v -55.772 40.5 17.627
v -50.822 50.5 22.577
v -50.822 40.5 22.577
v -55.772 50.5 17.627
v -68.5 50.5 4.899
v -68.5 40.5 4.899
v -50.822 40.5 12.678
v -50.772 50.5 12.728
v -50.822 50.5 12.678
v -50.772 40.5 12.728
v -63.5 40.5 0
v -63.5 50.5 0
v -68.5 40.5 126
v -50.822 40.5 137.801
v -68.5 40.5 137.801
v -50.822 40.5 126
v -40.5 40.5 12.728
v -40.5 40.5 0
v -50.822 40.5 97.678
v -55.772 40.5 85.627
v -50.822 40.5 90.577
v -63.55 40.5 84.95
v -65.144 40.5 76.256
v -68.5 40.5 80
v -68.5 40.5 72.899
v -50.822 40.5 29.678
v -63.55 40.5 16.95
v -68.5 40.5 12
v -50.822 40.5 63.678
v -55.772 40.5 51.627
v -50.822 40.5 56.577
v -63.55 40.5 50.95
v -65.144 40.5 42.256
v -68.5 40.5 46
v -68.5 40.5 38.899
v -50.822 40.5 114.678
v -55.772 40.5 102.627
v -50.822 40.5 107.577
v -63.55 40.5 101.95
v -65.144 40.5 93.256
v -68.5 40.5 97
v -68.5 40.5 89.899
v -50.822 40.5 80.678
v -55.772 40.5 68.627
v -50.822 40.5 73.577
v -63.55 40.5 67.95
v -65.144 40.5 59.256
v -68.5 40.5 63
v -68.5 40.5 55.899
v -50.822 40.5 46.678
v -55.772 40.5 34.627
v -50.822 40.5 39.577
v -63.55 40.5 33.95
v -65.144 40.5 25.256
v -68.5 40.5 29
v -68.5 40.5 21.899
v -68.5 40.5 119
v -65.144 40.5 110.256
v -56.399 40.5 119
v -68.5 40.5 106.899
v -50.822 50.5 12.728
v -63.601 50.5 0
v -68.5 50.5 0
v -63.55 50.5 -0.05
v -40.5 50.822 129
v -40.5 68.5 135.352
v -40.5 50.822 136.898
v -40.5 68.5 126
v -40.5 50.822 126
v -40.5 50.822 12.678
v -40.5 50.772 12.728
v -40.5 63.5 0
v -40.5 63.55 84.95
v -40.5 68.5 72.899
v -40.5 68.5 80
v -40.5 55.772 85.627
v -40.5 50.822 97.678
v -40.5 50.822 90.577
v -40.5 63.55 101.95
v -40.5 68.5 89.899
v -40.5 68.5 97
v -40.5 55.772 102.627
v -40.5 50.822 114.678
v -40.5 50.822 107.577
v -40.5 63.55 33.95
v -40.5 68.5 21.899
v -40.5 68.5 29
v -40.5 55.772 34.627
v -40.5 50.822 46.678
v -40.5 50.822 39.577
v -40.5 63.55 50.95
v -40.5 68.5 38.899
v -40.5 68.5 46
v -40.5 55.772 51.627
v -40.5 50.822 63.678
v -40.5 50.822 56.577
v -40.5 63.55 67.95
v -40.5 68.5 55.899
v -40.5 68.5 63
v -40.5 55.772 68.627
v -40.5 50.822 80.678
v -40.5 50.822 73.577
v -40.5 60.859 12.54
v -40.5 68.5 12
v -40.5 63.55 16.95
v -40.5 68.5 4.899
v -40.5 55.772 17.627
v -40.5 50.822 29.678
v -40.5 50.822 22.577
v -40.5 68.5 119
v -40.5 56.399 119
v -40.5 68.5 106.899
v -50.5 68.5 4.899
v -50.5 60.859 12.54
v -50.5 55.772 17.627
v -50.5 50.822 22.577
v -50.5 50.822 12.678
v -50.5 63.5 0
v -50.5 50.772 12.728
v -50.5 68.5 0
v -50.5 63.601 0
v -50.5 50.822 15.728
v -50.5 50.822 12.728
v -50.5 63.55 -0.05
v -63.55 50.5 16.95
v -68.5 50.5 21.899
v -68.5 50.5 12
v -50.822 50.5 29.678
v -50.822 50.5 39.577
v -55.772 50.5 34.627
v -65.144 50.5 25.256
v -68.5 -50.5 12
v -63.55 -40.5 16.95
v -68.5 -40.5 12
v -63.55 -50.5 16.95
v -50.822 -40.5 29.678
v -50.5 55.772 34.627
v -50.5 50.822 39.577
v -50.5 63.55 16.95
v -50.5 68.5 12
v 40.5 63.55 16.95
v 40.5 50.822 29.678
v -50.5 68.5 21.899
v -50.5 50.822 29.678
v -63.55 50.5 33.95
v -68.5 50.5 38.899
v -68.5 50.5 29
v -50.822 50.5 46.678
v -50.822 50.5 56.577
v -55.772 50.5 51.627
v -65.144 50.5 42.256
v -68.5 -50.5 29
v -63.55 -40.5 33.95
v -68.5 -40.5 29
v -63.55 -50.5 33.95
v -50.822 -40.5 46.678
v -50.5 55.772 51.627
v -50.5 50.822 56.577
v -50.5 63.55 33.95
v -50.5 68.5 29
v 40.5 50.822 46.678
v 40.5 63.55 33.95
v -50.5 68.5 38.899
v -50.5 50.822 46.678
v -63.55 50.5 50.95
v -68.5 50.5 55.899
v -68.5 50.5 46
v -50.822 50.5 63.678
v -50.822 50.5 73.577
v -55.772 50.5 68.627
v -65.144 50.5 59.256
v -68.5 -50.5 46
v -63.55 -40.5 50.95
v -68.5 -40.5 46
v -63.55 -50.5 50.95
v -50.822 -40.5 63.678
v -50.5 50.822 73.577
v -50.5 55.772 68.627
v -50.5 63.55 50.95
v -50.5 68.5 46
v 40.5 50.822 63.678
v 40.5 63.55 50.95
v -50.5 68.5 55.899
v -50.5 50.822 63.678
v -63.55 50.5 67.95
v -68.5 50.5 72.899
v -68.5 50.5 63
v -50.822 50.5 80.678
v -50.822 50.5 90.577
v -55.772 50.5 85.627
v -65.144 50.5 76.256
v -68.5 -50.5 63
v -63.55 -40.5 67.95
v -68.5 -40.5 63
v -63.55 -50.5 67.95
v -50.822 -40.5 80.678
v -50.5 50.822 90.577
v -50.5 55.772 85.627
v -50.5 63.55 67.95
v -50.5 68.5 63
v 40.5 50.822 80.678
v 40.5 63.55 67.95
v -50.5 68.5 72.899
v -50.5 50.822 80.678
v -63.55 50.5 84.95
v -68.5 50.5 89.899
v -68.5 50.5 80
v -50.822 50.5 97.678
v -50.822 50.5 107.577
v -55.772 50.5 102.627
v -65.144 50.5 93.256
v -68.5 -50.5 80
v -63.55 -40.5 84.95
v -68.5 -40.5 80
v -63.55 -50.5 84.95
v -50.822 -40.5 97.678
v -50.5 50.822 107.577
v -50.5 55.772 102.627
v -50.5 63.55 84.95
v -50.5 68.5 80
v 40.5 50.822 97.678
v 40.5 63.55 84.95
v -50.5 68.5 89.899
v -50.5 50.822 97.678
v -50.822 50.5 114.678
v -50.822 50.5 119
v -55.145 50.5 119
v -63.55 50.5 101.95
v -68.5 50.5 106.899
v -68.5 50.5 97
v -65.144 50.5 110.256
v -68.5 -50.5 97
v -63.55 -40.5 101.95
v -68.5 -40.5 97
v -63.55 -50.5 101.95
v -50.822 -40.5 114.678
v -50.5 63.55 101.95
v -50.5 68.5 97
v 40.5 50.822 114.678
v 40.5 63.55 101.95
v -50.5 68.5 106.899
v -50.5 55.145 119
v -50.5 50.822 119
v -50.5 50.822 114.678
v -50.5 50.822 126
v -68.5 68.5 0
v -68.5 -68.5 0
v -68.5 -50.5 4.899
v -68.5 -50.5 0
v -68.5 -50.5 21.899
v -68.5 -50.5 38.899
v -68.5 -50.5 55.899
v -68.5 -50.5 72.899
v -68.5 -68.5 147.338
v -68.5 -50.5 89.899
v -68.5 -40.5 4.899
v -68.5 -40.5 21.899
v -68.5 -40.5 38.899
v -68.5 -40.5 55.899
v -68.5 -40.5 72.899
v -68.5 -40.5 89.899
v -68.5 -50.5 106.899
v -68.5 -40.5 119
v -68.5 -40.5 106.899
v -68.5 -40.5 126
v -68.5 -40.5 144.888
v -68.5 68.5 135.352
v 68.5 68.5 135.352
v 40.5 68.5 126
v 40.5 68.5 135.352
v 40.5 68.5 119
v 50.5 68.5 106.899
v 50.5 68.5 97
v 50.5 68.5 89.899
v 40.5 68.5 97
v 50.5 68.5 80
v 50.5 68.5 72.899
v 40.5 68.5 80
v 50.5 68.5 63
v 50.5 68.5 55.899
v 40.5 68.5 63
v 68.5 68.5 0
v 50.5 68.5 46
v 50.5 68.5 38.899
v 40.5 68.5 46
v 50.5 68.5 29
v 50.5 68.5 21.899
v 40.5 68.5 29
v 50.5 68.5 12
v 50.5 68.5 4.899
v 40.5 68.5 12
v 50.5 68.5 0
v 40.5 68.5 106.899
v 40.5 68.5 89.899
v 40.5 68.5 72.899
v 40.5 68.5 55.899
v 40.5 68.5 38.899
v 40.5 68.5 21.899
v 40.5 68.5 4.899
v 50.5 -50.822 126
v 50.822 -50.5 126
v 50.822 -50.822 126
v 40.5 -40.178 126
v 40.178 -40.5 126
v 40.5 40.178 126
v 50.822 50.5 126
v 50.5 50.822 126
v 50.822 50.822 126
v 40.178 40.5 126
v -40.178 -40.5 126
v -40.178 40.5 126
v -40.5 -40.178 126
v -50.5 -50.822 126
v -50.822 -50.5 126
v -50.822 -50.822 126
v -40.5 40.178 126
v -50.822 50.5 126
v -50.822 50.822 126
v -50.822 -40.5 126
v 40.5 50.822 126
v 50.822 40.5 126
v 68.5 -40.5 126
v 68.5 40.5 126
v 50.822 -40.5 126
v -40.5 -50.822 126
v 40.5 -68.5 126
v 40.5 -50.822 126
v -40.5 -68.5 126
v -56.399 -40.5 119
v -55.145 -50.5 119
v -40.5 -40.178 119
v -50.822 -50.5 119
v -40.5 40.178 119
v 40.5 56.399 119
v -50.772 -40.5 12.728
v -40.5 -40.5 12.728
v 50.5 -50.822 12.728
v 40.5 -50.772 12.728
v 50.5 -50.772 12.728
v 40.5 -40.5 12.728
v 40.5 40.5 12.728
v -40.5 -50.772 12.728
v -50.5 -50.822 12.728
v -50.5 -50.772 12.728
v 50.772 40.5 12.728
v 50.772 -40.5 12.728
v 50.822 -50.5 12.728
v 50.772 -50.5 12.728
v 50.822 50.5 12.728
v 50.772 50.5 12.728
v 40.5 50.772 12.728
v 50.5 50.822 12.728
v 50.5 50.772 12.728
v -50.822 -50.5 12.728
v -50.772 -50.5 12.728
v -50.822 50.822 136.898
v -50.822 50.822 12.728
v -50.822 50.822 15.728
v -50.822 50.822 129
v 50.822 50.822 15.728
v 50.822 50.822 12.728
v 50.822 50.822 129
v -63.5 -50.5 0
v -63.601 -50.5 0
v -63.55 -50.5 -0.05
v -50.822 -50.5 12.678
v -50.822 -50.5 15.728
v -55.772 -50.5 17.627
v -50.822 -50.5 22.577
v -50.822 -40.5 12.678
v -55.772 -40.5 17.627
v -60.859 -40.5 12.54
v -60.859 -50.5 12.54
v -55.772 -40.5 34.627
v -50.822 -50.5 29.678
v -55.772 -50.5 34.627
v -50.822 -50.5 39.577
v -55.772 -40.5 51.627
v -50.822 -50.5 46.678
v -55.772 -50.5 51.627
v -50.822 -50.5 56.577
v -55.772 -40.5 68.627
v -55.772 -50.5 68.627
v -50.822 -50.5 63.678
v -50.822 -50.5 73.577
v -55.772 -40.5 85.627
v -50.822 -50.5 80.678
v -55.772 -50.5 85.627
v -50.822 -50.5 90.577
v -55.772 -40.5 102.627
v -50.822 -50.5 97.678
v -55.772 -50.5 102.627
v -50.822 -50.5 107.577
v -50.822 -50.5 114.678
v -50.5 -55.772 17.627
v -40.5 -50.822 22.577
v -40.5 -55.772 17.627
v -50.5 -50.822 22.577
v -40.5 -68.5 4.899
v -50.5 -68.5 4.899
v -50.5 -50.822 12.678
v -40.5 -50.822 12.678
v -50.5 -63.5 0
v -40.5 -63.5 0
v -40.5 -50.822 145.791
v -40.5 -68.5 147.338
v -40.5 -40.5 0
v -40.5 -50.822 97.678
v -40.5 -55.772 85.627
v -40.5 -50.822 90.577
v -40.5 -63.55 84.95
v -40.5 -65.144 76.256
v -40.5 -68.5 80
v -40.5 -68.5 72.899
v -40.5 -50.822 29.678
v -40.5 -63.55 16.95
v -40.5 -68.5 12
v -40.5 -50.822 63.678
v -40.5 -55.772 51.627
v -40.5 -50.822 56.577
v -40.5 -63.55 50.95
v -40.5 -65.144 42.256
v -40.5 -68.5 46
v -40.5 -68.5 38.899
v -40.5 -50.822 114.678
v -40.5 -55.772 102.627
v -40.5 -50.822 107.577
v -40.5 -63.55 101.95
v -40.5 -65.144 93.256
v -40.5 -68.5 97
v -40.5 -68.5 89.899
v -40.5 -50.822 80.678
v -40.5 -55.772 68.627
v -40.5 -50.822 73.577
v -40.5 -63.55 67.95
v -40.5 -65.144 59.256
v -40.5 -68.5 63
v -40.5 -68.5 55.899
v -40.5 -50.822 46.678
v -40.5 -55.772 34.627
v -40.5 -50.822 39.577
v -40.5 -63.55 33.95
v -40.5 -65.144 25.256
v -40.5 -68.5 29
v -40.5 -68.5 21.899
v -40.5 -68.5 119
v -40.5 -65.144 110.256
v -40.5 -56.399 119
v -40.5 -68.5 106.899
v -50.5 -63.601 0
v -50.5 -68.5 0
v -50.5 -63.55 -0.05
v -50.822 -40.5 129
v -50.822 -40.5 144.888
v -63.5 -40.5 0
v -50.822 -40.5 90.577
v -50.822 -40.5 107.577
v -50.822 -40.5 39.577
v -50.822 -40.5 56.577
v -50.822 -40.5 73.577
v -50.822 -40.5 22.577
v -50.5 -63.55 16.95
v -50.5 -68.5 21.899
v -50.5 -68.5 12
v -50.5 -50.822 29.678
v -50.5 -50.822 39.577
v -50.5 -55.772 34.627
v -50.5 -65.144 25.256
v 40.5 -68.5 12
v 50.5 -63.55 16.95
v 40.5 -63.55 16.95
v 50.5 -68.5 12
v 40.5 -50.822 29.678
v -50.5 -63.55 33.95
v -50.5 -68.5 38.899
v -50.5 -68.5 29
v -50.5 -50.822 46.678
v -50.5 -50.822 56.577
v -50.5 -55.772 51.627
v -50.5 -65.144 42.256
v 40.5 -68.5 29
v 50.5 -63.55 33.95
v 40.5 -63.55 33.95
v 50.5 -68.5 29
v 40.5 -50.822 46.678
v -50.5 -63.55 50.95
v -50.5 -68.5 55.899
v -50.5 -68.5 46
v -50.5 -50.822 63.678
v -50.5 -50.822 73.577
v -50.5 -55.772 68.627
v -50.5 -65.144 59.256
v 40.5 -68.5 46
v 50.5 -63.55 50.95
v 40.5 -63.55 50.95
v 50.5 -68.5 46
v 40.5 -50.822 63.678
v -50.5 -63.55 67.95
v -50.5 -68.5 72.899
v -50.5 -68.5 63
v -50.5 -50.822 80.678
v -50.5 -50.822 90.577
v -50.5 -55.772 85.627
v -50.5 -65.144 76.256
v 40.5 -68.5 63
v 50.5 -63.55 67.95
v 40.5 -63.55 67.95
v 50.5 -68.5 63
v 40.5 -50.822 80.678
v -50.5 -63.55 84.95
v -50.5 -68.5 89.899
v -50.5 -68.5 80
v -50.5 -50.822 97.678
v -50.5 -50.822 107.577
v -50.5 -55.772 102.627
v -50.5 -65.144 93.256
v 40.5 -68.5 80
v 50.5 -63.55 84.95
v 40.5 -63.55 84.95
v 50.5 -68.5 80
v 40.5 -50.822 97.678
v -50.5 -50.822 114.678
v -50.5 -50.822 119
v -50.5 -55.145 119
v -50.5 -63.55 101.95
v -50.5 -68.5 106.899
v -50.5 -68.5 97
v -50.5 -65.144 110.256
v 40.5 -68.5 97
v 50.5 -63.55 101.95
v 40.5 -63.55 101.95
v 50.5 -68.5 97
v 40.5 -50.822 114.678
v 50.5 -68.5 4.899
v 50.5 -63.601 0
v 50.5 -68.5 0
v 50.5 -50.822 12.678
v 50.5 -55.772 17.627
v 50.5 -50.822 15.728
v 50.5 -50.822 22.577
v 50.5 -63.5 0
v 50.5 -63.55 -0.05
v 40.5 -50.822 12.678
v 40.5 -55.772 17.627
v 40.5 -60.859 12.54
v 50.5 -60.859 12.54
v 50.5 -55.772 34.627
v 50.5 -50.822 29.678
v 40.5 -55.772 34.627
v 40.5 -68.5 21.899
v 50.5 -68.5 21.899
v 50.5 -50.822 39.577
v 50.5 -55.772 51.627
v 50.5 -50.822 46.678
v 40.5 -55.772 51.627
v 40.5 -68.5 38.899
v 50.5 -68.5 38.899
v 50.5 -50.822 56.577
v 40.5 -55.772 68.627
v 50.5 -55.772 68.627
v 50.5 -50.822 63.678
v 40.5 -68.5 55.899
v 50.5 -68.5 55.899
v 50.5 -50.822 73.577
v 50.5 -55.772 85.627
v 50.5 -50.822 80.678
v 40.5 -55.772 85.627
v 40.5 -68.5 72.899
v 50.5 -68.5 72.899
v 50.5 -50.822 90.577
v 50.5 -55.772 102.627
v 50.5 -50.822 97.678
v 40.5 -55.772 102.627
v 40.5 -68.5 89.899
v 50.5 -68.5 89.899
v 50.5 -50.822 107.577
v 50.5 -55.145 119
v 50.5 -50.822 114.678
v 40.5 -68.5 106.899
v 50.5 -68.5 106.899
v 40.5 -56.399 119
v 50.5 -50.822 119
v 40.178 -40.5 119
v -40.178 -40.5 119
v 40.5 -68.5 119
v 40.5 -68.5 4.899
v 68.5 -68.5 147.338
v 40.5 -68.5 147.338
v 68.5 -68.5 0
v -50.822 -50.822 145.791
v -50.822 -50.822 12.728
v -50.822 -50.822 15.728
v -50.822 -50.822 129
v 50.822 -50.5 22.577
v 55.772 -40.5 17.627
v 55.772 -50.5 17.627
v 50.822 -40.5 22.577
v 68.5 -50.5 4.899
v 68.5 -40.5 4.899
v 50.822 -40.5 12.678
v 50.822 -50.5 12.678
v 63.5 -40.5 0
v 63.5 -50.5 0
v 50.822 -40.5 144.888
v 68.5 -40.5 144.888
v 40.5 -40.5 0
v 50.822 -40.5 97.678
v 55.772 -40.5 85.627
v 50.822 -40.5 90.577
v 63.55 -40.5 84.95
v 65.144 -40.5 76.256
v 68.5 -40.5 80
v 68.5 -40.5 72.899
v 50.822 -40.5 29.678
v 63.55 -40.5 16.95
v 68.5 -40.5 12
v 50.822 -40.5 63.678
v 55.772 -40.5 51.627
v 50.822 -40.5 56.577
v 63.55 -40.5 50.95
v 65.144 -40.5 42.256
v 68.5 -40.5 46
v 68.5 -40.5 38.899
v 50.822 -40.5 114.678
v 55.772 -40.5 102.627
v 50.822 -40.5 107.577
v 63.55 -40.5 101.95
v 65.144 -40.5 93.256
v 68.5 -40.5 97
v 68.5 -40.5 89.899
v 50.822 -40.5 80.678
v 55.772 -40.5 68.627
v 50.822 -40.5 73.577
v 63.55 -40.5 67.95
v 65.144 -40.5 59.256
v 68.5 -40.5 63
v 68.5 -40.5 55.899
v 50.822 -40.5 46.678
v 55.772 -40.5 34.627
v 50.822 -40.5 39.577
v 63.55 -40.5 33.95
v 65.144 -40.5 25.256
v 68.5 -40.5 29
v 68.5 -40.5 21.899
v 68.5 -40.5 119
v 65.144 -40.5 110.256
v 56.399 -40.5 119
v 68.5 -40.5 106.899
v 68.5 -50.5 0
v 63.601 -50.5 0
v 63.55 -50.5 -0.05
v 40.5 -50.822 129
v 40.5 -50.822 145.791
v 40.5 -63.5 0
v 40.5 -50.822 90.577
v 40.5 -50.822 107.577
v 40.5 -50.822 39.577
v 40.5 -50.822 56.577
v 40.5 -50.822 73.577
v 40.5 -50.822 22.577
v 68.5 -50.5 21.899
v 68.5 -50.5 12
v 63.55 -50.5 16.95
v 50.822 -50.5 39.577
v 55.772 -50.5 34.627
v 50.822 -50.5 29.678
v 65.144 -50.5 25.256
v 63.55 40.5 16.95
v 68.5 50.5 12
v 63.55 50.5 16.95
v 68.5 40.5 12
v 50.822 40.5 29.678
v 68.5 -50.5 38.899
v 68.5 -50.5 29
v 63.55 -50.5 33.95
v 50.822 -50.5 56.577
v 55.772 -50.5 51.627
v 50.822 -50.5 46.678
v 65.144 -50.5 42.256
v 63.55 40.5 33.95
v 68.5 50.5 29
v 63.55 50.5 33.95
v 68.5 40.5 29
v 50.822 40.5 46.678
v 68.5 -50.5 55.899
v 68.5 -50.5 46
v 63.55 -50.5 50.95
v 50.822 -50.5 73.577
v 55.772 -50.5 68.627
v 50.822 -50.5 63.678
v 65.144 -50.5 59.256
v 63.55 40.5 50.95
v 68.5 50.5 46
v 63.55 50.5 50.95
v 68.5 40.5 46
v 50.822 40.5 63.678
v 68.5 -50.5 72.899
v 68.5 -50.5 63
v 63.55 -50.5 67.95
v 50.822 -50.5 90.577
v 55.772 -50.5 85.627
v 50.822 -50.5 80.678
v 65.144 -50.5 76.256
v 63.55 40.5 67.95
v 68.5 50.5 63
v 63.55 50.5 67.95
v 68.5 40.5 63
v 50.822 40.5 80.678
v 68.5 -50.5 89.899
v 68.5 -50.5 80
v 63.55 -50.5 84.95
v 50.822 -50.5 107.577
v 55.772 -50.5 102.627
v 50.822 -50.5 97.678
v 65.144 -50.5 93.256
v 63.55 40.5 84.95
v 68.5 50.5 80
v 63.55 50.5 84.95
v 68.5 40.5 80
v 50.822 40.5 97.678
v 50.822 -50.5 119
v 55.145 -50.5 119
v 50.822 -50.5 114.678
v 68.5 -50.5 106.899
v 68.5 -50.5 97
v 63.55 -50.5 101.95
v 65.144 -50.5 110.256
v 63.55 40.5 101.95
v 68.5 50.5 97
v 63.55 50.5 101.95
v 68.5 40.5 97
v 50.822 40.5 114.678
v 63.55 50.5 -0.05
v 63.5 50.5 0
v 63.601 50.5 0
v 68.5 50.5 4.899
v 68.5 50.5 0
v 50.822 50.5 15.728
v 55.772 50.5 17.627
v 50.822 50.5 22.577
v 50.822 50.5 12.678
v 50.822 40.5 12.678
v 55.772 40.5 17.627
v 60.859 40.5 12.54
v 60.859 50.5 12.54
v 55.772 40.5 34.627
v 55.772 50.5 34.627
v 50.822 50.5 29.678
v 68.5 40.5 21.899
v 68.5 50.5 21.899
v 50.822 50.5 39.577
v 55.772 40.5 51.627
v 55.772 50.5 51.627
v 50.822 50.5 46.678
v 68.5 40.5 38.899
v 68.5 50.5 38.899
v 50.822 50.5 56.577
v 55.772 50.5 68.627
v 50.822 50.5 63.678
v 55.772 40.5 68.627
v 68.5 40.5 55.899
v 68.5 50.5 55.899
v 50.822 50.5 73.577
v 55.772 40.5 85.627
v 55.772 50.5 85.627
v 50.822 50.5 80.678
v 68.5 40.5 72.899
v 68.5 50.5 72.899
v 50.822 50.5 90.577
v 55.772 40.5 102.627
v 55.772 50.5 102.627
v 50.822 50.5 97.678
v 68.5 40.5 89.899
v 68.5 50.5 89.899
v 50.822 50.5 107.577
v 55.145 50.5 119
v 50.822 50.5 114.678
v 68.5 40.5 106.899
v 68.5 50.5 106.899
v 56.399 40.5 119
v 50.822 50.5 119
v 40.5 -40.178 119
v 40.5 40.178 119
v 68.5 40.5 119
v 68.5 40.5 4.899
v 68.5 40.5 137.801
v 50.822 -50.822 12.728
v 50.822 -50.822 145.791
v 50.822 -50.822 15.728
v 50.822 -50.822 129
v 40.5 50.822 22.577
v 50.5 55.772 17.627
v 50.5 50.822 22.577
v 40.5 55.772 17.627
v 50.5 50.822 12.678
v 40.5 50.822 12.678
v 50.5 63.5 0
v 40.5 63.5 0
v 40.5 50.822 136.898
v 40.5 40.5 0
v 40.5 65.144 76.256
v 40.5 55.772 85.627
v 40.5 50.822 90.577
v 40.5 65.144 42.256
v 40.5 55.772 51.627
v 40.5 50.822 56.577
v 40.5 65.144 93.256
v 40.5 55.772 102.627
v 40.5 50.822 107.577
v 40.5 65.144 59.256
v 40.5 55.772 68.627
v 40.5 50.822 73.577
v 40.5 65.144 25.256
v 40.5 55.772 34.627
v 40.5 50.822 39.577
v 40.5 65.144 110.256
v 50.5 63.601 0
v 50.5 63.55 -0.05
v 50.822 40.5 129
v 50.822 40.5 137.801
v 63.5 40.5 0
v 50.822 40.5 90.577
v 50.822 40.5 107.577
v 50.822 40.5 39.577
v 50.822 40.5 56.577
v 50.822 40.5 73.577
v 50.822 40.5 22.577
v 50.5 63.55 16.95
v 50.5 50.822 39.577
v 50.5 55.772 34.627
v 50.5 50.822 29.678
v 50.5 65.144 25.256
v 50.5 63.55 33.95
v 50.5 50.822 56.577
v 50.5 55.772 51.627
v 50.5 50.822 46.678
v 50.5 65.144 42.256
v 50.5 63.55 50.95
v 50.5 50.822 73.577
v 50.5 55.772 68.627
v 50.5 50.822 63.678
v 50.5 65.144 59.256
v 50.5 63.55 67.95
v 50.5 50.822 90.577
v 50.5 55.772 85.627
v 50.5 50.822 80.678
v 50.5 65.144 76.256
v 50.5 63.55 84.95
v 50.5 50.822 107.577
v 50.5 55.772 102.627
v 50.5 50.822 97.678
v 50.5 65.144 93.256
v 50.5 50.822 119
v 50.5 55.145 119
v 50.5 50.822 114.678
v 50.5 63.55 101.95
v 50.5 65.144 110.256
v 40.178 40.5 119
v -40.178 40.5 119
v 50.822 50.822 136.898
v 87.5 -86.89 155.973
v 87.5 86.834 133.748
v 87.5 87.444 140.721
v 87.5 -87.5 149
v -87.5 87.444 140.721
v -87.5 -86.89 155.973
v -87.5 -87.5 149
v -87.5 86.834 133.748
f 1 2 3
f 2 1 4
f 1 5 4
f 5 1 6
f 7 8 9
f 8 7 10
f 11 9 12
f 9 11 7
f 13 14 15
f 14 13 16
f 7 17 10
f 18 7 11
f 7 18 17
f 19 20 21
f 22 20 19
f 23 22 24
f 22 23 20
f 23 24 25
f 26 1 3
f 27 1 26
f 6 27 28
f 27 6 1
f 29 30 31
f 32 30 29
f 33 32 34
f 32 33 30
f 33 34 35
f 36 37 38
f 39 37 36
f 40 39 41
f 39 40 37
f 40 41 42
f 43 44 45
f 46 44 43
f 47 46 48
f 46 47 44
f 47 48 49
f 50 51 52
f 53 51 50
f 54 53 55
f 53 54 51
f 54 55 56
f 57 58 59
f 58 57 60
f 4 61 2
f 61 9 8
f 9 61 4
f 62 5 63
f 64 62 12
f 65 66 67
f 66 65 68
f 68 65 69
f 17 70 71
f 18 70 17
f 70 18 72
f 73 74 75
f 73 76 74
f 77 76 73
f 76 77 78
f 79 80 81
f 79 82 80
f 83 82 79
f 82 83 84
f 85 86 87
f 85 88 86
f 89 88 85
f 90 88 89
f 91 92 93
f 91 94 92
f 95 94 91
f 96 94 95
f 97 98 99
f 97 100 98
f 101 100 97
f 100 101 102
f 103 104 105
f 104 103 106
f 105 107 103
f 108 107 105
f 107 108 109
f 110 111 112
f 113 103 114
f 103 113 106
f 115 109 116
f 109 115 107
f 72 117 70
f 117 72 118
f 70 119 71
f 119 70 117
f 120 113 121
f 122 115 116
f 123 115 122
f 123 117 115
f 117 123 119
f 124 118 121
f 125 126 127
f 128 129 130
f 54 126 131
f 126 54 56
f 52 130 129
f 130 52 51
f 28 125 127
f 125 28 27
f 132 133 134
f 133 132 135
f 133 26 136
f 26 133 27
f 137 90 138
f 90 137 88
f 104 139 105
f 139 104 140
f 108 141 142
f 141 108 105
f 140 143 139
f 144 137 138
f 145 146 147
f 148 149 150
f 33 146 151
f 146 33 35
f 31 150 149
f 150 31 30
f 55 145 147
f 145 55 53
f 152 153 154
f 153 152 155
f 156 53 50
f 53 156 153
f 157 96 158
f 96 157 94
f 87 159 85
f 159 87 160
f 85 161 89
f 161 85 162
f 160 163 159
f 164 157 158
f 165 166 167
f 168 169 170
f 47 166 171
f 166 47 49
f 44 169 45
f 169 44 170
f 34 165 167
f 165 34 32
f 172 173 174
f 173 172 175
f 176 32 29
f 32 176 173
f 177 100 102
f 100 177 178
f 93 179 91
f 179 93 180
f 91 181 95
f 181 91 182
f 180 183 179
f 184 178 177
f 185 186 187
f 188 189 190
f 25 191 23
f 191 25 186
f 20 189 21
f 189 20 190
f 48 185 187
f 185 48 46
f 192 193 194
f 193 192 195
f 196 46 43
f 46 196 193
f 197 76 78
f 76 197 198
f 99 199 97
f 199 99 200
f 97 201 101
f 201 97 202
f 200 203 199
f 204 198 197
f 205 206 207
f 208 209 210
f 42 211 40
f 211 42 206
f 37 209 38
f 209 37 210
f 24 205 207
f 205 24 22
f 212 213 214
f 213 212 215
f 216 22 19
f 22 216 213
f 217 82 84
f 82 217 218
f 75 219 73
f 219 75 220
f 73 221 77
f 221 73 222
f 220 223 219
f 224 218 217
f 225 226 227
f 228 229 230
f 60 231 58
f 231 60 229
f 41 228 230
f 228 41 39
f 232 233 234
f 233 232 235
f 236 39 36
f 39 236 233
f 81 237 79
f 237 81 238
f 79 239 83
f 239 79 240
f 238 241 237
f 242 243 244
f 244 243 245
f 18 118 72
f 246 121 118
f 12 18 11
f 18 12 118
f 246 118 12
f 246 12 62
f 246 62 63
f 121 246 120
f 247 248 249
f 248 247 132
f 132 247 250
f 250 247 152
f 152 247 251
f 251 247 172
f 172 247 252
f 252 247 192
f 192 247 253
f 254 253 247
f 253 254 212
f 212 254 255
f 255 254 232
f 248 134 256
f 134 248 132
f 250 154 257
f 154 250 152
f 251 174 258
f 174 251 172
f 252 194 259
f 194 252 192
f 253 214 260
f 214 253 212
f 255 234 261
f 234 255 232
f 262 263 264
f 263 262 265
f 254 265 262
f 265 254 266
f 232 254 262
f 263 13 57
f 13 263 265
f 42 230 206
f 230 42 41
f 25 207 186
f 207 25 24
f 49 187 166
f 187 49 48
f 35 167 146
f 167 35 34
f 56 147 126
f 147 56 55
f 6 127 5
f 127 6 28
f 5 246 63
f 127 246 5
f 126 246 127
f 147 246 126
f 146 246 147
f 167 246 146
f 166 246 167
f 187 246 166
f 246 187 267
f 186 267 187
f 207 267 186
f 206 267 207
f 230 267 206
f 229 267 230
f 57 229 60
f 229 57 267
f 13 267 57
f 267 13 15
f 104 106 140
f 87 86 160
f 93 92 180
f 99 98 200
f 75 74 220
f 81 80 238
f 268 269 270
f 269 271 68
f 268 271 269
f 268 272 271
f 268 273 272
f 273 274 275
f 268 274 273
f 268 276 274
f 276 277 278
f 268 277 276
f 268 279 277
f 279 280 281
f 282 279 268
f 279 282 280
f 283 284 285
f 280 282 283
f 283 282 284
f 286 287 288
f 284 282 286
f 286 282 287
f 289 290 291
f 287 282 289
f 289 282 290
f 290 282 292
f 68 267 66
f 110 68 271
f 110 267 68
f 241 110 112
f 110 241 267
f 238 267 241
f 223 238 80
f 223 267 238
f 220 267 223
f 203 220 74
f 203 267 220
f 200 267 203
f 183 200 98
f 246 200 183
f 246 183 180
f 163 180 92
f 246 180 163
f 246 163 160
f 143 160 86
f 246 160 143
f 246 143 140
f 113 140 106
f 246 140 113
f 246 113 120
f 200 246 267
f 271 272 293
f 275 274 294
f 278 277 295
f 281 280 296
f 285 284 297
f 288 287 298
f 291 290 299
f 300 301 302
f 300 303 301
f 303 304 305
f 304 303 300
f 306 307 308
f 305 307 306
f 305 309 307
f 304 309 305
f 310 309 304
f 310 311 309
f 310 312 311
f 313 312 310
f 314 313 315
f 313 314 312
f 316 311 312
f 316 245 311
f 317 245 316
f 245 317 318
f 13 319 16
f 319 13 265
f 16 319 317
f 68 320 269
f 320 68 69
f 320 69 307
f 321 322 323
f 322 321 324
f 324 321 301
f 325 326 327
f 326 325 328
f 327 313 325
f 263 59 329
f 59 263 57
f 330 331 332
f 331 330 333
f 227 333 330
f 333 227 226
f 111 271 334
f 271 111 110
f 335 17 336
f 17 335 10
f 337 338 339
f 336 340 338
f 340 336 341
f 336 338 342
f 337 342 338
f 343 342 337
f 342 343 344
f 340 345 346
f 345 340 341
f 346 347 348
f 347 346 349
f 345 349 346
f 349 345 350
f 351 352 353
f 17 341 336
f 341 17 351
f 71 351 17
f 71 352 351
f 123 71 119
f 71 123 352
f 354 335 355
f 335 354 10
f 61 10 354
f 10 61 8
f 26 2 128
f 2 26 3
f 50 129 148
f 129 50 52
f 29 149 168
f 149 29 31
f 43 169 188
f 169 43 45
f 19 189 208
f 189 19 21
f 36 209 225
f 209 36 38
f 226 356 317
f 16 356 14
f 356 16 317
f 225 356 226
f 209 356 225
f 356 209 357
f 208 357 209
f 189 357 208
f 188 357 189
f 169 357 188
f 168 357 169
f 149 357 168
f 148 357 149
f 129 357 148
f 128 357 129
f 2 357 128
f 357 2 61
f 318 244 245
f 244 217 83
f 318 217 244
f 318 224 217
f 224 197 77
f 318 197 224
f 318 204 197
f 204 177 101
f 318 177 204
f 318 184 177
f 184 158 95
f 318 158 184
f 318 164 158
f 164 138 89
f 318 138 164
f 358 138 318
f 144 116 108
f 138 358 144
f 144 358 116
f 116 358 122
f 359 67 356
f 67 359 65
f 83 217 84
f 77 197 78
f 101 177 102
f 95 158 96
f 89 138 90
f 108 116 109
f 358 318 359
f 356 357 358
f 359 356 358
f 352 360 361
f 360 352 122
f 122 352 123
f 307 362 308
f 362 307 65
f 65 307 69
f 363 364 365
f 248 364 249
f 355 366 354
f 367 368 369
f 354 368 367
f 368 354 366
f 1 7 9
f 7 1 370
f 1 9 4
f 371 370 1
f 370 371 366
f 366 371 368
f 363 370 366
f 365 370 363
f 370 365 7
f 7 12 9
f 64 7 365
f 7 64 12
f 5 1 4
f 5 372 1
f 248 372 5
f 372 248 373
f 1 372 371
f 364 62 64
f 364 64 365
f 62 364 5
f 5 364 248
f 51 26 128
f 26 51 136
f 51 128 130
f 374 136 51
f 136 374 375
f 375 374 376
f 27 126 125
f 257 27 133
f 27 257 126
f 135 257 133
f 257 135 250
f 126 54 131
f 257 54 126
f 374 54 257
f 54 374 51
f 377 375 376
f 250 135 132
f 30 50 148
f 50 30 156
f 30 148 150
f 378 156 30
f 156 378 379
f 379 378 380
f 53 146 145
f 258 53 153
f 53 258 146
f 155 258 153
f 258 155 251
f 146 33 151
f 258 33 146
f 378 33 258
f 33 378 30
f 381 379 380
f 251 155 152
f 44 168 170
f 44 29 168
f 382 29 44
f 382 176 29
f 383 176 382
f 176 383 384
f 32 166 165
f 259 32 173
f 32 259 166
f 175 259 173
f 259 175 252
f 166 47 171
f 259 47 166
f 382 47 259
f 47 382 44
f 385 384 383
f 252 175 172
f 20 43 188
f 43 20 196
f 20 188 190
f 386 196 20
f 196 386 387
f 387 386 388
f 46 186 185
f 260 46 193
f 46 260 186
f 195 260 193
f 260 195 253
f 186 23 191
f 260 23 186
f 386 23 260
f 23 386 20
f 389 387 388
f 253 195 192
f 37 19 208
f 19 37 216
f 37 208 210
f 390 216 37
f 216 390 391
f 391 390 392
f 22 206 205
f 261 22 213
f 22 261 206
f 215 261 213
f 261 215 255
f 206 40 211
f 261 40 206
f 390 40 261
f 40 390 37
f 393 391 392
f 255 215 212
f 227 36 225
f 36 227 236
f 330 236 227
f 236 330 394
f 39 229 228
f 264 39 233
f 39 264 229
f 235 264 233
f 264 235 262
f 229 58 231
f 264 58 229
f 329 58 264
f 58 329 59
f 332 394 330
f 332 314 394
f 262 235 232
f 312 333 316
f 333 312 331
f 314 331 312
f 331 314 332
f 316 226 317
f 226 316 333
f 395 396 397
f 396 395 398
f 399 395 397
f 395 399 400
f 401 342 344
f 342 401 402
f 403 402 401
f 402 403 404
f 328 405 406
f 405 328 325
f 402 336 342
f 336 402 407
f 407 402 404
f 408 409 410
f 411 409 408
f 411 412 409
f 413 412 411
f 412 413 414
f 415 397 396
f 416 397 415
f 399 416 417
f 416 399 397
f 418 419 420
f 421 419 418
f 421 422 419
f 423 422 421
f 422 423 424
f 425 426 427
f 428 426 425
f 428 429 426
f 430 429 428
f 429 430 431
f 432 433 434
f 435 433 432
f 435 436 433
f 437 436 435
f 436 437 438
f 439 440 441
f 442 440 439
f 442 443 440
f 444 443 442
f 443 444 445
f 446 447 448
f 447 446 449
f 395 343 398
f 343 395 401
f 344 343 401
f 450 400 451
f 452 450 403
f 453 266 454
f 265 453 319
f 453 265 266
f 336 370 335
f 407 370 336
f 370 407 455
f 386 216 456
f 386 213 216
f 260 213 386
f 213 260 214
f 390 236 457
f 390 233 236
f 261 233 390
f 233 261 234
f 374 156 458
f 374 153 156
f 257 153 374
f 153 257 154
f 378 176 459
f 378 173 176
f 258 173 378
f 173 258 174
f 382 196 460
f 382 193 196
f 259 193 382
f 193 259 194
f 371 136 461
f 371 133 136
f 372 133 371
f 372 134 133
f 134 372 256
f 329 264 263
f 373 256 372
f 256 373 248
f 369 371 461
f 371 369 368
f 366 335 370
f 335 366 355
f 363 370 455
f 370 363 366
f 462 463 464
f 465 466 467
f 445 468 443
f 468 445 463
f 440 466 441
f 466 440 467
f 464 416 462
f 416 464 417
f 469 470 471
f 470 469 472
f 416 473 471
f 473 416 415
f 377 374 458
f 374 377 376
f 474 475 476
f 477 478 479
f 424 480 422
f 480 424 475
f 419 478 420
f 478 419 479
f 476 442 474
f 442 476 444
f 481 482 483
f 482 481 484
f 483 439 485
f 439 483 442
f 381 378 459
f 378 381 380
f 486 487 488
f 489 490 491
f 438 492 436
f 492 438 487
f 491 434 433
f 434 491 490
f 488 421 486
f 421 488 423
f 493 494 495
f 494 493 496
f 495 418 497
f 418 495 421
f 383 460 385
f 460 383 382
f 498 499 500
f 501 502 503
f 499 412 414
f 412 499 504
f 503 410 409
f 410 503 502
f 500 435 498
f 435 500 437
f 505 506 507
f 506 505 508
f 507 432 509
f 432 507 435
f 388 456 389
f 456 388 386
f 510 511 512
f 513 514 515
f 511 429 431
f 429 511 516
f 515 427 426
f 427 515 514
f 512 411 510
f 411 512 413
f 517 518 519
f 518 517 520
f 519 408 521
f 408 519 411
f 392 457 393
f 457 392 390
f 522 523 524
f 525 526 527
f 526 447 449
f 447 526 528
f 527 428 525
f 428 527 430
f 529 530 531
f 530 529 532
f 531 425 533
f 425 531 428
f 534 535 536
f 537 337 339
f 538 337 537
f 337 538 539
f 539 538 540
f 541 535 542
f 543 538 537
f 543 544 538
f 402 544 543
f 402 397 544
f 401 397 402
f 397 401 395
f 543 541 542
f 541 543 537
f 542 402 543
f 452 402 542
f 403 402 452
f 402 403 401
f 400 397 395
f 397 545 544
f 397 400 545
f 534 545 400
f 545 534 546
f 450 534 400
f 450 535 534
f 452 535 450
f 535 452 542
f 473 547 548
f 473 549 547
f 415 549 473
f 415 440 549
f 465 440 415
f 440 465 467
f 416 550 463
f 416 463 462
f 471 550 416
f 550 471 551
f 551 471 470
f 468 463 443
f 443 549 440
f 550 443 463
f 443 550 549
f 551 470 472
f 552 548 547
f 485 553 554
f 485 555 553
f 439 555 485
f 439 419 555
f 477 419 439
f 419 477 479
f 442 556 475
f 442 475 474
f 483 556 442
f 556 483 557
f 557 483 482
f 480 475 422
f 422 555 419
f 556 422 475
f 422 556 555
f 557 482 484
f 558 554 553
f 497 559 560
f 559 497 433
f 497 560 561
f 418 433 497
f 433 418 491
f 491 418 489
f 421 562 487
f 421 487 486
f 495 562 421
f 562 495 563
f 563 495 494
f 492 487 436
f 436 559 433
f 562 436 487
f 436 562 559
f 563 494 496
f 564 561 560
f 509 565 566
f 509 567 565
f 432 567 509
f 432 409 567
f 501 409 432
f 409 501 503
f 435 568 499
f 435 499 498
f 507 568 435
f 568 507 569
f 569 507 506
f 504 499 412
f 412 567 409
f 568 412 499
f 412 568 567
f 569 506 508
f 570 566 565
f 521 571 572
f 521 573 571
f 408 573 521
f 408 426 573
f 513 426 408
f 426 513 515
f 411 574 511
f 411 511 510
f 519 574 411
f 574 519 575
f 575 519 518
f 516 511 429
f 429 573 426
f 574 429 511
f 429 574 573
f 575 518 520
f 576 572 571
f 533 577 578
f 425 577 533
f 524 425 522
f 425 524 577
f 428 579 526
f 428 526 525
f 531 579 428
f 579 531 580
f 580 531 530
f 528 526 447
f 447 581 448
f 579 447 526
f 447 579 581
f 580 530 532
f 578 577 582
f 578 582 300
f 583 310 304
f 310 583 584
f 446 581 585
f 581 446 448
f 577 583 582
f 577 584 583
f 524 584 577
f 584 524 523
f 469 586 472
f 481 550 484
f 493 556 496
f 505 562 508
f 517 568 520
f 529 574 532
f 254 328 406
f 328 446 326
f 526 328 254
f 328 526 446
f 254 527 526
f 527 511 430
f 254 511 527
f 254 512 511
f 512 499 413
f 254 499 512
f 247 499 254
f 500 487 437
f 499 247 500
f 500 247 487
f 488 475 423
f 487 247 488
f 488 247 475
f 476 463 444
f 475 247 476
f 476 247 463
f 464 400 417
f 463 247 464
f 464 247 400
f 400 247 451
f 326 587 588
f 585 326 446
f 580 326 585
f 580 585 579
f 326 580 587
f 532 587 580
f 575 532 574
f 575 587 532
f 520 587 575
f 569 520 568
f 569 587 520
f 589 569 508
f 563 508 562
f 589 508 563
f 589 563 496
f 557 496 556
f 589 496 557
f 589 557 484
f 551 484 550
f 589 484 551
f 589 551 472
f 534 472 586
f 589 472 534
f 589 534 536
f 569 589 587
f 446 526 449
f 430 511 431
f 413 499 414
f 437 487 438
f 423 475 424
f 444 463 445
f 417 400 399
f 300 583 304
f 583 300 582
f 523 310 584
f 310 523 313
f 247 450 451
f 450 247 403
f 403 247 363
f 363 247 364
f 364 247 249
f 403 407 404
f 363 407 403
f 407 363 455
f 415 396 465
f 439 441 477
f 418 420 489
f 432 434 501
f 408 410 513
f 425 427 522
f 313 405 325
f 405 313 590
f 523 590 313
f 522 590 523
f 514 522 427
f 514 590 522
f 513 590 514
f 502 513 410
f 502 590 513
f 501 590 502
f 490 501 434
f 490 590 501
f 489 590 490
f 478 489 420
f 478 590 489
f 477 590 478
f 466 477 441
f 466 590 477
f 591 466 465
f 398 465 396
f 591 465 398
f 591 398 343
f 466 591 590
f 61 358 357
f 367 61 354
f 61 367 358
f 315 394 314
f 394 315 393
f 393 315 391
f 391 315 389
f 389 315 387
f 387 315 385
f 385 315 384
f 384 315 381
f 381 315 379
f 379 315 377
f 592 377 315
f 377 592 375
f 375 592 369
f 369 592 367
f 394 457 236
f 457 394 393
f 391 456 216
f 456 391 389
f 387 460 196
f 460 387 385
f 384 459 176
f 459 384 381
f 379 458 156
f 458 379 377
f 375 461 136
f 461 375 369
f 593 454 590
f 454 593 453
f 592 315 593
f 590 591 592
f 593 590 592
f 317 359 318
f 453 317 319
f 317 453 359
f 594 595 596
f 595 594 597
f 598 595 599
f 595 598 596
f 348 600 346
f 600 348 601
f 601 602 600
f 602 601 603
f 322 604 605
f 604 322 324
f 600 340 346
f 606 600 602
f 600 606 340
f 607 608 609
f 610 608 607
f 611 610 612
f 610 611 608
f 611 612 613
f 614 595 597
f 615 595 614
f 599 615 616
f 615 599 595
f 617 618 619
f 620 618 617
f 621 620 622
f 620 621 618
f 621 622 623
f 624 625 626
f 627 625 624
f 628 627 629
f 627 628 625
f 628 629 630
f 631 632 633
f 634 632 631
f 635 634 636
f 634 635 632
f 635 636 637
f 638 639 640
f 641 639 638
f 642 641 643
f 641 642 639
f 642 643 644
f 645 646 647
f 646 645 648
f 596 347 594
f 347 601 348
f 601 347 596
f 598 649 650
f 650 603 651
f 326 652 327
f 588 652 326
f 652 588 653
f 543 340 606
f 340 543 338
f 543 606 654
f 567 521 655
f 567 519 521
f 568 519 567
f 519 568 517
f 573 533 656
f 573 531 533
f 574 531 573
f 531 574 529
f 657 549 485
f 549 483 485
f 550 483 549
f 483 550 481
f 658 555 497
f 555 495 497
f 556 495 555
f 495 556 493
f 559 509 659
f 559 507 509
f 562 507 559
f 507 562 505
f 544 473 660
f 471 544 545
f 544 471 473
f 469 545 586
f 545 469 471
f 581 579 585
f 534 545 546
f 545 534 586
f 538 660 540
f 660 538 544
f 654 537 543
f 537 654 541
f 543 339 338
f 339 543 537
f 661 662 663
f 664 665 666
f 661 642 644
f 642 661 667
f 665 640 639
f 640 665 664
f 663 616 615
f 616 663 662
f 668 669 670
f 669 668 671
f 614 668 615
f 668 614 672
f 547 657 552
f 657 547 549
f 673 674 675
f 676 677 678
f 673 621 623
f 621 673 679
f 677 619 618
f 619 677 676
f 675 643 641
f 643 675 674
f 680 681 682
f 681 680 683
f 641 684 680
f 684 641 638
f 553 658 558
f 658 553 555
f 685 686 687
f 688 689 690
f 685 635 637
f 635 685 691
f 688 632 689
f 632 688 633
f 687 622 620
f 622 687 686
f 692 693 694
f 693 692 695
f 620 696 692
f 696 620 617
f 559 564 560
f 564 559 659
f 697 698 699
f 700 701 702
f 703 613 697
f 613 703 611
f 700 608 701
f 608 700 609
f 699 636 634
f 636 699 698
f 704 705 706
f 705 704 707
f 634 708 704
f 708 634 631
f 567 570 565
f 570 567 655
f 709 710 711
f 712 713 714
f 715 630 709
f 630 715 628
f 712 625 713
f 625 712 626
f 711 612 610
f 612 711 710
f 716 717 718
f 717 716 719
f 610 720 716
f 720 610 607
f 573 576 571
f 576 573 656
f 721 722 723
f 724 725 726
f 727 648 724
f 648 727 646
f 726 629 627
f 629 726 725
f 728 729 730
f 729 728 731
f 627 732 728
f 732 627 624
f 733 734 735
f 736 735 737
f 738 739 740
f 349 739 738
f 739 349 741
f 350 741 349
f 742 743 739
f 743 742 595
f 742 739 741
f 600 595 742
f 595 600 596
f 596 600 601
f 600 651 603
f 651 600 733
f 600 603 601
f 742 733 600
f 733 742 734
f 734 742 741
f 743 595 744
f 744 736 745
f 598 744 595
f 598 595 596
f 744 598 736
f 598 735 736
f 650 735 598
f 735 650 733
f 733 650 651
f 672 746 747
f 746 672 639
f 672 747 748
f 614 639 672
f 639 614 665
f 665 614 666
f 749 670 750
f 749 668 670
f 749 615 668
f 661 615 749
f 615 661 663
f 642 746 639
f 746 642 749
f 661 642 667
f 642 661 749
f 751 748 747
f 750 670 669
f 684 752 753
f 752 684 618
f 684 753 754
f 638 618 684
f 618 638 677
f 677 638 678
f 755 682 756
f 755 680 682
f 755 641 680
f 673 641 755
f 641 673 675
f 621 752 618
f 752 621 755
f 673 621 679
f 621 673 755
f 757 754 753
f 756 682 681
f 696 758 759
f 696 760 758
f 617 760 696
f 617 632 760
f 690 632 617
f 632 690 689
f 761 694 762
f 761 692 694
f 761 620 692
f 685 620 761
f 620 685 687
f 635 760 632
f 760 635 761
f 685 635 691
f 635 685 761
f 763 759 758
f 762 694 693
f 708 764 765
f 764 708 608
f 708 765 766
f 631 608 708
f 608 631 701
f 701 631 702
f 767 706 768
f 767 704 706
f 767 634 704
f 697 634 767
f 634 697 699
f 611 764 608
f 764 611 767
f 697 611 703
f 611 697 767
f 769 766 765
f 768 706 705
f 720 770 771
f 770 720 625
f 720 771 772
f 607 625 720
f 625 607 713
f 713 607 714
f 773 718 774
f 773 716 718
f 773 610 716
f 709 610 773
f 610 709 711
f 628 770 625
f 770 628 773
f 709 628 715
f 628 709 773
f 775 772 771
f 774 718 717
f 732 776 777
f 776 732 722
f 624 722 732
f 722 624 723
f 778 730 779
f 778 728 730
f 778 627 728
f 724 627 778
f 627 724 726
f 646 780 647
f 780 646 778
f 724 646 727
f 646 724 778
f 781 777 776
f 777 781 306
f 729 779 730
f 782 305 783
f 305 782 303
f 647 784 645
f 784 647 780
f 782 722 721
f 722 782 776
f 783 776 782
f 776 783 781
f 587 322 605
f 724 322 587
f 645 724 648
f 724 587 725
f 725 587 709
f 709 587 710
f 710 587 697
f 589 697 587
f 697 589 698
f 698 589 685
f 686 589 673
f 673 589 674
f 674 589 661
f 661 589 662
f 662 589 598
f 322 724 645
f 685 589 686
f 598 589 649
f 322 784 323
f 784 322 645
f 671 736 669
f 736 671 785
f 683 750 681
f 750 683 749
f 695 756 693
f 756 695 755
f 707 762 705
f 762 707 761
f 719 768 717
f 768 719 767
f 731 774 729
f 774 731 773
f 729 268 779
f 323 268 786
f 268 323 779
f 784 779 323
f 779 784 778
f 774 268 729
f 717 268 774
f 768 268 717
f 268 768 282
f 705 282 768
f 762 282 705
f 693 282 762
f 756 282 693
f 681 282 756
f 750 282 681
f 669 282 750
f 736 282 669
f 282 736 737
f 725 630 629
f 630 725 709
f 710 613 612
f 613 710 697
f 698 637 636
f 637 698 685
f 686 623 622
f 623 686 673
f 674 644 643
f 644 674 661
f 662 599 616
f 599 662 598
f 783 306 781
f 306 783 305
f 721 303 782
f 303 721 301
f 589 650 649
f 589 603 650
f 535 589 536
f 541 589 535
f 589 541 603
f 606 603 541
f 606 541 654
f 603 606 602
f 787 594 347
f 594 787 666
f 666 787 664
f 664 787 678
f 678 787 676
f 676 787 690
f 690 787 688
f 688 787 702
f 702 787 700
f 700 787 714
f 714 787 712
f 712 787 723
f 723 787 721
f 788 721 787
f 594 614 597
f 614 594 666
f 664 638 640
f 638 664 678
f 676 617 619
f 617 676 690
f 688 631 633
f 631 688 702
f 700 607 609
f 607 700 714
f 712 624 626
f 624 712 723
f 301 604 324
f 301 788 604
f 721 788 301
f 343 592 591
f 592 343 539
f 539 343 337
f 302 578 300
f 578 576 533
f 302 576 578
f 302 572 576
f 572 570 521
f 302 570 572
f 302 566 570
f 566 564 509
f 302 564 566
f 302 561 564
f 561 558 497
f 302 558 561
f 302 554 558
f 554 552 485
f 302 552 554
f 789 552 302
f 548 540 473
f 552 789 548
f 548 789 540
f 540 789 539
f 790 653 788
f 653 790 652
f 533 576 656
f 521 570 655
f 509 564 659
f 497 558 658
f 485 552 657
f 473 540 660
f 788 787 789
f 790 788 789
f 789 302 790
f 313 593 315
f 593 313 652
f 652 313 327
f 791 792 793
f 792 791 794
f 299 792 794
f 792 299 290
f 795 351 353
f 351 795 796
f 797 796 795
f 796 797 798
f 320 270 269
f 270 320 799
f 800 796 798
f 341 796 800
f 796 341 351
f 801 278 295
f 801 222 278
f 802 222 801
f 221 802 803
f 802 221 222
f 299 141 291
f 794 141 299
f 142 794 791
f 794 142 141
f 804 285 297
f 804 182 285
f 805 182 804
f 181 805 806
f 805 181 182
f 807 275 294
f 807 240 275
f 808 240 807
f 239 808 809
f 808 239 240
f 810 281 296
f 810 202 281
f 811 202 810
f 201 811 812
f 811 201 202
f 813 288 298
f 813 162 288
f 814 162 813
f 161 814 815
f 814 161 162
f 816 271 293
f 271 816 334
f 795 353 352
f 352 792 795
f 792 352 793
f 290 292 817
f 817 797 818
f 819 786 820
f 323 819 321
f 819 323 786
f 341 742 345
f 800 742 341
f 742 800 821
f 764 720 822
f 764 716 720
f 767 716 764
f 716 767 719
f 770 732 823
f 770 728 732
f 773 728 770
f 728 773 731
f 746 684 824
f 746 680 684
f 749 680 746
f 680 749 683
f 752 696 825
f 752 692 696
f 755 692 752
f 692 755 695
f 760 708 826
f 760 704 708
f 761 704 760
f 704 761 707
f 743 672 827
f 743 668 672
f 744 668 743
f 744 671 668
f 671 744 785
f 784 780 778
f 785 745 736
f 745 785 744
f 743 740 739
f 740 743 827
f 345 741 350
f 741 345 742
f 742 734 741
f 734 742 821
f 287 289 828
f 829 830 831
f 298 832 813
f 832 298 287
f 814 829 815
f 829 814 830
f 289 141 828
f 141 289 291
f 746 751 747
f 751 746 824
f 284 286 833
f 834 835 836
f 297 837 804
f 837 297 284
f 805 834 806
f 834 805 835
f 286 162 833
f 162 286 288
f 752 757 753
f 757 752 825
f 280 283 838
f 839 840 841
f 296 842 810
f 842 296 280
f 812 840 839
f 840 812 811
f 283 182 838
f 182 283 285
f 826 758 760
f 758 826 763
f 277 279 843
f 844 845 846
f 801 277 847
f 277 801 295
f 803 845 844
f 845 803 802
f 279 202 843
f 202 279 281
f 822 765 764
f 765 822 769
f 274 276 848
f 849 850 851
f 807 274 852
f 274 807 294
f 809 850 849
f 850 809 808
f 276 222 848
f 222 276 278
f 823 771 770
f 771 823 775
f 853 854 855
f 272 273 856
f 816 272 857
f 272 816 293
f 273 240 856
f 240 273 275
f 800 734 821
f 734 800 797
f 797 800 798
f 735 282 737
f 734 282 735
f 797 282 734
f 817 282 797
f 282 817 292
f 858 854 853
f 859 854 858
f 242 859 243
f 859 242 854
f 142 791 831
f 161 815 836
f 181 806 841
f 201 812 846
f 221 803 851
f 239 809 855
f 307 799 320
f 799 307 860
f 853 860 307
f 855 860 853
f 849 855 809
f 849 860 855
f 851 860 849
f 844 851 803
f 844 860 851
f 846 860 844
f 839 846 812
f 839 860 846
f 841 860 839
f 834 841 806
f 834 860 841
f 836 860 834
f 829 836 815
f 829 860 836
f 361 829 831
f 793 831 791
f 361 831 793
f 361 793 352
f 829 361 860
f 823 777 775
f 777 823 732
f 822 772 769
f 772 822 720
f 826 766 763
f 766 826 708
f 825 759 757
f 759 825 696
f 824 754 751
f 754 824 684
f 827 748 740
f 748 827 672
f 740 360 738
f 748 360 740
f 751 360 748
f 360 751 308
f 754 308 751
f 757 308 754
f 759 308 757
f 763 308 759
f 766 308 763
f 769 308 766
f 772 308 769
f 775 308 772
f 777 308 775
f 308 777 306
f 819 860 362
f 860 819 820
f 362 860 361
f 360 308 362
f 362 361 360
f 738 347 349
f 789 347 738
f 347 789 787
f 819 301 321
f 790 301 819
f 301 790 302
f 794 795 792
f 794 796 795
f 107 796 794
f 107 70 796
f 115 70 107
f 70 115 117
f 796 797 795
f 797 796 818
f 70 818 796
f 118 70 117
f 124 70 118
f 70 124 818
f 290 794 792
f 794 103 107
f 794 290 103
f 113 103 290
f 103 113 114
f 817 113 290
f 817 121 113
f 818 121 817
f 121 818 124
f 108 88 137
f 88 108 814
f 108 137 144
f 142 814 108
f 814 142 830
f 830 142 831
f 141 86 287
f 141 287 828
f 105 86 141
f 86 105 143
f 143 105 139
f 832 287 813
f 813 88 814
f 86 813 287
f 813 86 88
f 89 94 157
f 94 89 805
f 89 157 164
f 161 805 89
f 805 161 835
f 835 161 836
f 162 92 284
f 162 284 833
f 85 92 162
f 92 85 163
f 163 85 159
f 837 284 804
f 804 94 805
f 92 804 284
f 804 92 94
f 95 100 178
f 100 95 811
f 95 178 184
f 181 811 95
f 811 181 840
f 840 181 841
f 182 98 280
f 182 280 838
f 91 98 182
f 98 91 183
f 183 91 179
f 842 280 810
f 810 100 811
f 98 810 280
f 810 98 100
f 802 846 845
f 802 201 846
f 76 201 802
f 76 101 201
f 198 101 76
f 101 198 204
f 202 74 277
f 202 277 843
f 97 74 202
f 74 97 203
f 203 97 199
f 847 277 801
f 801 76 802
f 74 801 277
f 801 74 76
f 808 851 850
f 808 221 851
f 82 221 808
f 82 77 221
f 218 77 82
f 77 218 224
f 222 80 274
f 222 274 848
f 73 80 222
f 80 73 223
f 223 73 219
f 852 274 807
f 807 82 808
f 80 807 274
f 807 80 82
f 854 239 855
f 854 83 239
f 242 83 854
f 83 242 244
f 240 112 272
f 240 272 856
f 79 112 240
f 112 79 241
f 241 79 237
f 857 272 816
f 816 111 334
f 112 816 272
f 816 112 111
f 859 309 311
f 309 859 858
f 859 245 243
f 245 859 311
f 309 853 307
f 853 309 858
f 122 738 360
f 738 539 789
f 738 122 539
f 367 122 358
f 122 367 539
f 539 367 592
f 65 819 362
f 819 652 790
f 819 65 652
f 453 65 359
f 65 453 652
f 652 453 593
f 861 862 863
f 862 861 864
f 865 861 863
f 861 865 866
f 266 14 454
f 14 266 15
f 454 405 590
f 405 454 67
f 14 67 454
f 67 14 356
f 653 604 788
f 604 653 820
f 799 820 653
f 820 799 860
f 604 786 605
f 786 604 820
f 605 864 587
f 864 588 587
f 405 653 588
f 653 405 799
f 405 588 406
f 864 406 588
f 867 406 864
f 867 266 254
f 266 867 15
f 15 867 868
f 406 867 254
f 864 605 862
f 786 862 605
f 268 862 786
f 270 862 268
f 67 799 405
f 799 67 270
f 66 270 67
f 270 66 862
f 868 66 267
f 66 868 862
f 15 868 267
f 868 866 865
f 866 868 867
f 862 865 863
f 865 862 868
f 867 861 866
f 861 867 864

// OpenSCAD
function hypotenuse(l) = sqrt(pow(l, 2) * 2);
function cathetus(l) = sqrt(pow(l, 2) / 2);

module groove(i, columnWidth, grooveDepth, louvreHeight) {
    
    cutoutLength = hypotenuse(columnWidth) + cathetus(louvreHeight);

    translate([0, 0, i])
        rotate([0, -45, 0])
            cube([cutoutLength, grooveDepth, louvreHeight]);
}

module column(columnWidth, columnHeight, grooveDepth, grooveSeparation, louvreHeight, louvreDepth, louvreCount, backCut) {

    firstLouvre = -grooveDepth / 2;
    lastLouvre = grooveSeparation * (louvreCount - 1);
    louvreTop = lastLouvre + grooveSeparation;
    
    difference() {
        // Column
        cube([columnWidth, columnWidth, columnHeight]);
        
        // Cut out diagonal grooves
        for (i = [firstLouvre : grooveSeparation : lastLouvre]) {
            groove(i, columnWidth, grooveDepth, louvreHeight); 
            translate([columnWidth - grooveDepth, columnWidth, 0])
                rotate([0, 0, -90])
                    groove(i, columnWidth, grooveDepth, louvreHeight);
        }
        
        // Cut out top groove
        translate([0, 0, louvreTop])
            cube([columnWidth, grooveDepth, louvreHeight]);
        translate([columnWidth - grooveDepth, columnWidth, louvreTop])
            rotate([0, 0, -90])
                cube([columnWidth, grooveDepth, louvreHeight]);
        
        // Cut out back
        translate([backCut, 0, cathetus(louvreDepth)])
            cube([columnWidth - backCut, columnWidth - backCut, columnHeight]);
    }
}

module louvre(columnWidth, columnHeight, grooveDepth, grooveSeparation, louvreHeight, louvreWidth, louvreDepth, louvreCount) {

    firstLouvre = -grooveDepth / 2;
    lastLouvre = grooveSeparation * (louvreCount - 1);
    
    for (i = [firstLouvre : grooveSeparation : lastLouvre]) 
        translate([0, -louvreWidth + grooveDepth, i + hypotenuse(louvreHeight)])
            rotate([0, 45, 0])
                cube([louvreHeight, louvreWidth, louvreDepth]);
}

module sill(columnWidth, grooveDepth, grooveSeparation, louvreHeight, louvreWidth, louvreCount, backCut) {
    
    translate([0, - louvreWidth + grooveDepth, grooveSeparation * louvreCount])
        difference() {
            cube([columnWidth, louvreWidth, louvreHeight]);
            translate([backCut, 0, 0])    
                rotate([0, 0, -45])
                    cube([backCut, backCut, louvreHeight]);
            translate([backCut, louvreWidth, 0])    
                rotate([0, 0, -45])
                    cube([backCut, backCut, louvreHeight]);
        }
}

module sides(s, columnWidth, louvreHeight, louvreDepth, louvreCount) {
    
    grooveDepth = round(hypotenuse(louvreHeight));
    grooveSeparation = floor(cathetus(louvreDepth)) + grooveDepth / 2;

    louvreWidth = grooveSeparation * louvreCount - (columnWidth - grooveDepth);// * 2;
    
    columnExtra = 40;
    columnHeight = grooveSeparation * louvreCount;

    columnSeparation = louvreWidth - grooveDepth * 2;
    
    backCut = cathetus(louvreHeight) + cathetus(louvreDepth);
    
    offsetX = columnSeparation / 2 + columnWidth;
    offsetY = columnSeparation / 2;
    
    for (i=[0 : s - 1]) {
        
        columnExtra = i % 3 ? 30 : 20;
        
        rotate([0, 0, i * 90])
            translate([-offsetX, offsetY, 0])  {
                column(columnWidth, columnHeight + columnExtra, grooveDepth, grooveSeparation, louvreHeight, louvreDepth, louvreCount, backCut);
                louvre(columnWidth, columnHeight, grooveDepth, grooveSeparation, louvreHeight, louvreWidth, louvreDepth, louvreCount);
                sill(columnWidth, grooveDepth, grooveSeparation, louvreHeight, louvreWidth, louvreCount, backCut);
            }
    }

    capOffset = - (offsetY + columnWidth - backCut);
    capWidth = columnSeparation + (columnWidth - backCut) * 2;

    // lower cap
    translate([capOffset, capOffset, cathetus(louvreDepth)])
        cube([capWidth, capWidth, 3]);
  
    // upper cap
    translate([capOffset, capOffset, columnHeight + louvreHeight])
        cube([capWidth, capWidth, 3]);
    
    // top cap
    topOffset = - (offsetY + columnWidth + 19);
    topWidth = columnSeparation + 2 * columnWidth + 38;
    echo(topWidth);
    translate([topOffset, topOffset, columnHeight + 30])
        rotate([-5, 0, 0])
            cube([topWidth, topWidth, louvreHeight]);
}

COLUMN_WIDTH = 28;
LOUVRE_HEIGHT = 7;
LOUVRE_DEPTH = 18;
LOUVRE_COUNT = 7;

color("white")
    sides(4, COLUMN_WIDTH, LOUVRE_HEIGHT, LOUVRE_DEPTH, LOUVRE_COUNT);
